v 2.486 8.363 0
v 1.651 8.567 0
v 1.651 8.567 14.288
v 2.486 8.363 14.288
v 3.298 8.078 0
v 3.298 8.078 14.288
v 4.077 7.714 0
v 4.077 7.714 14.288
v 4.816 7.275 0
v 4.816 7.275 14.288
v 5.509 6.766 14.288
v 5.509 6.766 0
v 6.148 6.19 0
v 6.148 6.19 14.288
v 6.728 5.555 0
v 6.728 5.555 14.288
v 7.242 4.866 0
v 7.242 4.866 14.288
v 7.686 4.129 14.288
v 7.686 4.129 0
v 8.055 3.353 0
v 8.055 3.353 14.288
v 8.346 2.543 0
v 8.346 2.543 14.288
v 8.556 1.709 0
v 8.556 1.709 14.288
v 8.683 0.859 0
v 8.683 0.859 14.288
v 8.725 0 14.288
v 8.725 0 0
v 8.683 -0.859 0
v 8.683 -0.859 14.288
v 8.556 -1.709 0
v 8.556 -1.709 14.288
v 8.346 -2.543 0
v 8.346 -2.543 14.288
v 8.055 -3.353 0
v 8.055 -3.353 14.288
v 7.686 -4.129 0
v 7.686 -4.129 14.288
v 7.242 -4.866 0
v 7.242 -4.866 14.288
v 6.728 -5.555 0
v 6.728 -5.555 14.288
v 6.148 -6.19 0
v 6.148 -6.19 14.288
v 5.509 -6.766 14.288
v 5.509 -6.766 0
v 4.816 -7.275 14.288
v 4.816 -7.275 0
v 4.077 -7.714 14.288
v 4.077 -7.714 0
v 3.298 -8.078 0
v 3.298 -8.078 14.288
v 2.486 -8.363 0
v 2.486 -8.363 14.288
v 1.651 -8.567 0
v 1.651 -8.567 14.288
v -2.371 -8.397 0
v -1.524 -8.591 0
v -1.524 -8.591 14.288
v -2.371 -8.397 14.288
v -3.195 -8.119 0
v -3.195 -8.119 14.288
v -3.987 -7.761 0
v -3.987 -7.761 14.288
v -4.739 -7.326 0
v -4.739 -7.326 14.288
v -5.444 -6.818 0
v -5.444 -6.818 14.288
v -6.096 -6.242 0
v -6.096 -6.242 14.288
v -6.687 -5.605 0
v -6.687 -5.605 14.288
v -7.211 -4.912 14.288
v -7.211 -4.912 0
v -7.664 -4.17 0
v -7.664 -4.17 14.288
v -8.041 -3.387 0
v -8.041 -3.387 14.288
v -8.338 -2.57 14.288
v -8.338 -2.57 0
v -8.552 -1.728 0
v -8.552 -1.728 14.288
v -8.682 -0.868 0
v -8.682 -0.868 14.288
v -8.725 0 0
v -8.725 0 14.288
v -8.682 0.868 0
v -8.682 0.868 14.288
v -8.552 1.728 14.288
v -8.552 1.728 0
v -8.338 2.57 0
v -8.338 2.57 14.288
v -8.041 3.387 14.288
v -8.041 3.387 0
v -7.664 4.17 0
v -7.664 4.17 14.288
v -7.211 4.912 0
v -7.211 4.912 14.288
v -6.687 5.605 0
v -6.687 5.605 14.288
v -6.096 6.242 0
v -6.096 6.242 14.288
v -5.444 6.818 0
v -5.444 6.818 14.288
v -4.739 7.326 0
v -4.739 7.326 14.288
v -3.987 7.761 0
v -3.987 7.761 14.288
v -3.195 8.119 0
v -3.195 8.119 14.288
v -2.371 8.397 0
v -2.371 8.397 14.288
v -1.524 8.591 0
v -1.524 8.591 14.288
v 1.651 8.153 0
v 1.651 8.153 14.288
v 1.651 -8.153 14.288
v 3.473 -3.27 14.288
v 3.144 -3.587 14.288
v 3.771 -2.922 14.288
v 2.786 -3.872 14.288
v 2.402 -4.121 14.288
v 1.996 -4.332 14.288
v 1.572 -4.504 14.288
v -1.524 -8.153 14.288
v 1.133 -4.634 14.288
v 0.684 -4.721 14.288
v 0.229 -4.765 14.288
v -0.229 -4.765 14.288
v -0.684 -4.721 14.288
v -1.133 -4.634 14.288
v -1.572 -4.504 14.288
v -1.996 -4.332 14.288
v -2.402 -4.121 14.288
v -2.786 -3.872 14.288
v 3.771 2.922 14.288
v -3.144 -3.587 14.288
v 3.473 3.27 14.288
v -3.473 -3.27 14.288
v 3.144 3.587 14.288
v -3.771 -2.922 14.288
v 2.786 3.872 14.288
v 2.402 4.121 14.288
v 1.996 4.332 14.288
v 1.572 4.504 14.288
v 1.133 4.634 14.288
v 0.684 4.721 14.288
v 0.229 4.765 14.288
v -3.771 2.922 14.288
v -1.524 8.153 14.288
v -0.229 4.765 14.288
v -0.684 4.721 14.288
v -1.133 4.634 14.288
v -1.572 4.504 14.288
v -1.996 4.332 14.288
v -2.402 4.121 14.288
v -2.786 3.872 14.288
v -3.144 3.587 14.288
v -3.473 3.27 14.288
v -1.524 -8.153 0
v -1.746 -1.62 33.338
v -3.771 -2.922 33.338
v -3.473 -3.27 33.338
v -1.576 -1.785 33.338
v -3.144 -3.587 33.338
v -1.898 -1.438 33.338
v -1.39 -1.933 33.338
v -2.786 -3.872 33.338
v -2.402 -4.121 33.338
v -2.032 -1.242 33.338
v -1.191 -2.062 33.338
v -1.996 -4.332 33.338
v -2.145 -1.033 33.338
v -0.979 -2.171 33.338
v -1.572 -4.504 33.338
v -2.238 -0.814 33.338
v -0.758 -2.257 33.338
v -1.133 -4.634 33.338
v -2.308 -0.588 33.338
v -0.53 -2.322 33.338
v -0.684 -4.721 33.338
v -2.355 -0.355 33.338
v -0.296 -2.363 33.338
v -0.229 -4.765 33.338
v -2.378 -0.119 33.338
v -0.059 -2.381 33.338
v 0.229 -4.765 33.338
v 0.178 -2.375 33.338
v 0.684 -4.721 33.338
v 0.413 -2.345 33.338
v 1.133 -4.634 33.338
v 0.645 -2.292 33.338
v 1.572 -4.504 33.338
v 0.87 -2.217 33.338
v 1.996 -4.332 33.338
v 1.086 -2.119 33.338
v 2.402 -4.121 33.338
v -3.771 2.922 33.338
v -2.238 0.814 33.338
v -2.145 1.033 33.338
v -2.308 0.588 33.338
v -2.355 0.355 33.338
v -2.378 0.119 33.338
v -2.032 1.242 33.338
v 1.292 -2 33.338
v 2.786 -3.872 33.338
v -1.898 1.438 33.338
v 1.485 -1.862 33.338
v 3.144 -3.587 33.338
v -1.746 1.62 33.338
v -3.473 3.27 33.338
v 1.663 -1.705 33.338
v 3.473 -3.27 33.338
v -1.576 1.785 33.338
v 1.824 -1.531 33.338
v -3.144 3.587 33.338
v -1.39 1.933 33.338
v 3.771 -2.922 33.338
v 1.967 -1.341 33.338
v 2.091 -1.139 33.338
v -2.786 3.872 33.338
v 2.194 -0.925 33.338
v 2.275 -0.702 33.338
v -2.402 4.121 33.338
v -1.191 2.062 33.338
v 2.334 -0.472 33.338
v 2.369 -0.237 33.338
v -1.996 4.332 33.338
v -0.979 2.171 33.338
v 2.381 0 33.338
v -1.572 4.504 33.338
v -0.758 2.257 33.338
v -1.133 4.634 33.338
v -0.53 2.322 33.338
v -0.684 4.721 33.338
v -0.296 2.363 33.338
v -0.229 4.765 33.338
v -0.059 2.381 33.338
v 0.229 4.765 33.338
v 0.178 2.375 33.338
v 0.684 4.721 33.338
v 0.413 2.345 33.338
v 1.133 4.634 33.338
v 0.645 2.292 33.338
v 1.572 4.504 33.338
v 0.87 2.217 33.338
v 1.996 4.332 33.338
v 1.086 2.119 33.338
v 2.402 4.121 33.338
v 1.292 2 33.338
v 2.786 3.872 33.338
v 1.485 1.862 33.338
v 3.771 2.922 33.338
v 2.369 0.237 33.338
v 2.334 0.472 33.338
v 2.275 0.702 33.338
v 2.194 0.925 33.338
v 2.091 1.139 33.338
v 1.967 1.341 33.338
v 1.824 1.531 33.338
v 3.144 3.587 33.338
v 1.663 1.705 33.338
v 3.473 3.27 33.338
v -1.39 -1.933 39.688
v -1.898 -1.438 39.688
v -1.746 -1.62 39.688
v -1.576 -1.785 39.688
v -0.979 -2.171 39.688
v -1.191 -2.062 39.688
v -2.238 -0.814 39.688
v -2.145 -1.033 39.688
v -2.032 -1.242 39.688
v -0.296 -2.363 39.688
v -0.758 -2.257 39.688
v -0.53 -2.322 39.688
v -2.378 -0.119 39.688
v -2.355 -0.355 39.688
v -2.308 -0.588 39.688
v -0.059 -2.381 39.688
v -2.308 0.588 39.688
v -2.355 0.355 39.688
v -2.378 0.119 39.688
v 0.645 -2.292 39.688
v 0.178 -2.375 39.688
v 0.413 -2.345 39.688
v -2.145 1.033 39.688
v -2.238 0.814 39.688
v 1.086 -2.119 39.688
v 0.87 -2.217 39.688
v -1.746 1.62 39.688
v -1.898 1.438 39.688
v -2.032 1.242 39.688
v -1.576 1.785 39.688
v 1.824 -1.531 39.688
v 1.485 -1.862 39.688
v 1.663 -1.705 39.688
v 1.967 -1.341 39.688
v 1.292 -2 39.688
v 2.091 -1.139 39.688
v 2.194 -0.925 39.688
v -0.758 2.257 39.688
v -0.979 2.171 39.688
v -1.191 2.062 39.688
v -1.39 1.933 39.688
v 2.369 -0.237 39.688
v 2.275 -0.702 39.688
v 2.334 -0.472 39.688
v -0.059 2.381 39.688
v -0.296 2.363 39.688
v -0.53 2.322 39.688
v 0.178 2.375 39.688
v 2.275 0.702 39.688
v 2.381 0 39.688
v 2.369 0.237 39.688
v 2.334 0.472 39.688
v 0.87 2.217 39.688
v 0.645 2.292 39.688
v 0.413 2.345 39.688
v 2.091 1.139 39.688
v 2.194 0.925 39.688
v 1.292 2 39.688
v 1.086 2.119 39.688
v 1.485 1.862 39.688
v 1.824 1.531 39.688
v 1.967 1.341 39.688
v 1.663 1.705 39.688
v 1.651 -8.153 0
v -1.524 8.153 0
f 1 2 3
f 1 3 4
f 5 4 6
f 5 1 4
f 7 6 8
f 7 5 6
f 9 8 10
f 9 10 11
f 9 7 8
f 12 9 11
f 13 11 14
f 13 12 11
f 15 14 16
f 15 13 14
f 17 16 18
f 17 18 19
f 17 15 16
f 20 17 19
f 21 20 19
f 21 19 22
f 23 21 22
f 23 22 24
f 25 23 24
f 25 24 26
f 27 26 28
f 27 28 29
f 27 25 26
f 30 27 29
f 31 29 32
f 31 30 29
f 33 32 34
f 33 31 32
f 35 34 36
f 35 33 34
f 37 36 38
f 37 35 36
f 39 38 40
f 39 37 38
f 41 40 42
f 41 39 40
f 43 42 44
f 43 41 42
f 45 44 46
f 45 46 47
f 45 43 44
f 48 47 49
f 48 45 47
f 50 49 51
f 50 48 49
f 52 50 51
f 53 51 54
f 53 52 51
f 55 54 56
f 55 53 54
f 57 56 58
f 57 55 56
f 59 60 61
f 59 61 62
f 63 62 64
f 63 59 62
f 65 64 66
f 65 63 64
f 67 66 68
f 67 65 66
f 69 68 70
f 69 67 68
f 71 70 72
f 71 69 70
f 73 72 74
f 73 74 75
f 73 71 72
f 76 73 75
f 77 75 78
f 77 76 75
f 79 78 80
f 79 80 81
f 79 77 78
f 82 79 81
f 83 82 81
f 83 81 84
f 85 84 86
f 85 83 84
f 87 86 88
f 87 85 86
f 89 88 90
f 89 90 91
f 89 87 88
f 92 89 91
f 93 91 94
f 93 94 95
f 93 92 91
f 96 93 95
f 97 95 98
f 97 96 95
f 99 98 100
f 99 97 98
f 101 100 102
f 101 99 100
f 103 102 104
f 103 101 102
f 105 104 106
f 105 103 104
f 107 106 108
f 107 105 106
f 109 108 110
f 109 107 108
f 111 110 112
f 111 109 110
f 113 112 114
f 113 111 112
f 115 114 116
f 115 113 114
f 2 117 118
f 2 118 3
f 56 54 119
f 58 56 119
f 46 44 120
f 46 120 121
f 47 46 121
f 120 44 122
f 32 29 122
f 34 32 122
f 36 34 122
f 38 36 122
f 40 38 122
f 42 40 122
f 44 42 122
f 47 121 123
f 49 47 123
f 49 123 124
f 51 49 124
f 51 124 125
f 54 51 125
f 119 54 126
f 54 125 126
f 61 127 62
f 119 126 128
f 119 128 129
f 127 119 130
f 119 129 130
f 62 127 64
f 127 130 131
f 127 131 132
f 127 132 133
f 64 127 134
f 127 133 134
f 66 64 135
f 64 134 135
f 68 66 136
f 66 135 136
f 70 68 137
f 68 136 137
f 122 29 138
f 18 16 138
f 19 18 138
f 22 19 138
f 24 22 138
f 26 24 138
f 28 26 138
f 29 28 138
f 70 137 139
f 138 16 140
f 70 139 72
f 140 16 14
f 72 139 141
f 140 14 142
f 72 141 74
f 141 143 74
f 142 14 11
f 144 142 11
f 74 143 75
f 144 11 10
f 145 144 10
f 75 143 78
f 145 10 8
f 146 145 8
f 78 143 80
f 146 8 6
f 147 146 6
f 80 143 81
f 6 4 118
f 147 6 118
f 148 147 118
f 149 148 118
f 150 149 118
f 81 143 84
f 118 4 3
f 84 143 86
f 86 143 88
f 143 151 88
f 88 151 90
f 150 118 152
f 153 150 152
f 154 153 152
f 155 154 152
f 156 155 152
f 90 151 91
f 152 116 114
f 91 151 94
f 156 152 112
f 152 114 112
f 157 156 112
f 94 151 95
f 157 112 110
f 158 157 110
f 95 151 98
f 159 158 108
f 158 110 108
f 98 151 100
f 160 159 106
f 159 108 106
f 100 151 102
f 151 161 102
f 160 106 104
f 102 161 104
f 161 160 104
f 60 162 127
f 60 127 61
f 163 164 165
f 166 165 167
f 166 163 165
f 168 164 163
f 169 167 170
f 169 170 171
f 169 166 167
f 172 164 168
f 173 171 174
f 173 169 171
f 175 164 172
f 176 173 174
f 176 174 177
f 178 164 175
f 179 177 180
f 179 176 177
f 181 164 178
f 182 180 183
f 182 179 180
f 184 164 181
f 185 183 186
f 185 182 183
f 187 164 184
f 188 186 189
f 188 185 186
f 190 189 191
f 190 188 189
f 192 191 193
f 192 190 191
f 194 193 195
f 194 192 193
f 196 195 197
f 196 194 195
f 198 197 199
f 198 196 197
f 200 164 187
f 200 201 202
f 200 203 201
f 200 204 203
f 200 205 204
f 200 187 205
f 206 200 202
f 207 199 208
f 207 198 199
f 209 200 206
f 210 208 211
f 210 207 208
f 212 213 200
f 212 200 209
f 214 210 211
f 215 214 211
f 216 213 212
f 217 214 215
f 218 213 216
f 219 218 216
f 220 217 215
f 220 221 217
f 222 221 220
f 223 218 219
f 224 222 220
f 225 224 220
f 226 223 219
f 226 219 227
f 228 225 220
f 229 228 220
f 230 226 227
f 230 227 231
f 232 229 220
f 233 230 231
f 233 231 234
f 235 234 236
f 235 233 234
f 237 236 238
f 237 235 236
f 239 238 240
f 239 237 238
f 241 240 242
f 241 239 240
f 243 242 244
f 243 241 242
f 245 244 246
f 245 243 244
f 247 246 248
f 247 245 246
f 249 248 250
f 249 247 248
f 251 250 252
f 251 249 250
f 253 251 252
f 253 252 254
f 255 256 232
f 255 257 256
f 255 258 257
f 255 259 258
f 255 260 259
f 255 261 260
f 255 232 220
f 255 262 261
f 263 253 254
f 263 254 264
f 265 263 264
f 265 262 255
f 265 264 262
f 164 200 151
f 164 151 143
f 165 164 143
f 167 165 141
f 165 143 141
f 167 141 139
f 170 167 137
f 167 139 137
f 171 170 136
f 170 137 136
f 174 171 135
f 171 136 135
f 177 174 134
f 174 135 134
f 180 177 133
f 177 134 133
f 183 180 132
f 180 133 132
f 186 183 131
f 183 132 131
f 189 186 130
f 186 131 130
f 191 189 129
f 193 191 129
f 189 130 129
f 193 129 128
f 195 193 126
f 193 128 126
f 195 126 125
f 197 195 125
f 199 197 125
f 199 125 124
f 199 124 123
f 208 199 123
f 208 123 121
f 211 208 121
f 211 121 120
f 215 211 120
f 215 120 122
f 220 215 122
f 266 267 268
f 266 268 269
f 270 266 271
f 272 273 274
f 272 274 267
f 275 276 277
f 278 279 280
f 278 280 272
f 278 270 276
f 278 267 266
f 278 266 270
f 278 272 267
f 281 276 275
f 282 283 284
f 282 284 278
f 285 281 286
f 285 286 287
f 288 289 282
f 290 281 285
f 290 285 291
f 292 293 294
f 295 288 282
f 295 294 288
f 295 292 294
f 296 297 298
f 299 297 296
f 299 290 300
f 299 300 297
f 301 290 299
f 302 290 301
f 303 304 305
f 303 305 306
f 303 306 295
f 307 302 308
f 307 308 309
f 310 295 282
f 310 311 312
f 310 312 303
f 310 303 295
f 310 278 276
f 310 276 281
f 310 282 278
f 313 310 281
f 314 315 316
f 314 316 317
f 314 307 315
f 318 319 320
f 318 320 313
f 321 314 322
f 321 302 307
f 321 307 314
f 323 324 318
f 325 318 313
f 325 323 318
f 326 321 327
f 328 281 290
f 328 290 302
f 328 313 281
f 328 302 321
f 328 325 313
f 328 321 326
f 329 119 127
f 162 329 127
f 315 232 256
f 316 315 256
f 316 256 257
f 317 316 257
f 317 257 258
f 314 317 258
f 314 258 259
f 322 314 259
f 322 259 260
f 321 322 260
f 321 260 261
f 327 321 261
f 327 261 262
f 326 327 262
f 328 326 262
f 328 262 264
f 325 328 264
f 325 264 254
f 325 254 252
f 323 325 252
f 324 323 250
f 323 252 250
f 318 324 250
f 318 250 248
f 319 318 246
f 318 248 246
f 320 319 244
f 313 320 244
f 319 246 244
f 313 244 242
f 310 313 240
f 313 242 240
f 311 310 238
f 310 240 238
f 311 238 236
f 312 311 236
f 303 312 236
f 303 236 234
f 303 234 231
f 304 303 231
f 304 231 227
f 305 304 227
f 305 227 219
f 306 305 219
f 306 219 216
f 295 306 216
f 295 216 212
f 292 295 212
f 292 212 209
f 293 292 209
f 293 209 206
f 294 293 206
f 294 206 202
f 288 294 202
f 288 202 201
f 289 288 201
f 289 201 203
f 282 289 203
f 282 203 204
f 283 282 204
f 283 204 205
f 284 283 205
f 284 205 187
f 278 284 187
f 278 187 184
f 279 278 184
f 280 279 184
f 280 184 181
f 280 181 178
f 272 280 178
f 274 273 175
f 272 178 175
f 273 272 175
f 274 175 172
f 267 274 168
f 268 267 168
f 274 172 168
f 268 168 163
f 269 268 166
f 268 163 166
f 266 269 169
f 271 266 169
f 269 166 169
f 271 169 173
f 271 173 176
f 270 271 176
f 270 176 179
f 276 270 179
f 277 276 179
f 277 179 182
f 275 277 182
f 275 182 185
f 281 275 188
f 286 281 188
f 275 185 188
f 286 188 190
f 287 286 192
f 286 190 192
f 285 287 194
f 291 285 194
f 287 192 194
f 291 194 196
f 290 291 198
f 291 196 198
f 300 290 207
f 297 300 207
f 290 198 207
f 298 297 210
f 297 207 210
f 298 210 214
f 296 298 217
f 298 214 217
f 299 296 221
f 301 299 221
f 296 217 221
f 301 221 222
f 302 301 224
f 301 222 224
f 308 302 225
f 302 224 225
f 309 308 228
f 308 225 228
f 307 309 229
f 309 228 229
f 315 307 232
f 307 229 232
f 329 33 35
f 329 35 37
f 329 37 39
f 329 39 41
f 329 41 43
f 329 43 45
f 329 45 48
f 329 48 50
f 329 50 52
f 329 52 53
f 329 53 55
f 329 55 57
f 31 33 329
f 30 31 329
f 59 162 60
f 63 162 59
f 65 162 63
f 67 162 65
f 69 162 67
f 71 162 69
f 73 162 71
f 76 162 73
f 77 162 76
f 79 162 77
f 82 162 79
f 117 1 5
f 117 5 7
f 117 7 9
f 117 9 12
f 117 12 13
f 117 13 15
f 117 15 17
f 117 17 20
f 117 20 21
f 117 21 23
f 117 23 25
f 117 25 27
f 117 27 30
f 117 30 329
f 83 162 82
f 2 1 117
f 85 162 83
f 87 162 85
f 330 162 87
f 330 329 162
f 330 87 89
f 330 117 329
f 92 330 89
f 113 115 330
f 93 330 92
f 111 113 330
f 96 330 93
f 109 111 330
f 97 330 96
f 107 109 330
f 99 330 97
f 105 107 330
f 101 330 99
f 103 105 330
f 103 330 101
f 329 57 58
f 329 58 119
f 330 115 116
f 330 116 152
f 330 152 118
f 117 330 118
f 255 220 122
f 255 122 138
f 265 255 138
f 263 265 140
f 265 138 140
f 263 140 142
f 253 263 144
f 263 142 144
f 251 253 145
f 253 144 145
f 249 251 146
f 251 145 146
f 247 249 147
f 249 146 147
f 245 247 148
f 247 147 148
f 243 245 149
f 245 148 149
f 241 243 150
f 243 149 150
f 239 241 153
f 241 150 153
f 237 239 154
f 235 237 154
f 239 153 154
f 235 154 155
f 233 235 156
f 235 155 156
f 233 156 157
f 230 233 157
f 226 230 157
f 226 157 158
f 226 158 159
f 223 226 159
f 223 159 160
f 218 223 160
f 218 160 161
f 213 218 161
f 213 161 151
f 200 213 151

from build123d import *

# Parameters (mm, degrees)
SALIENTE_EXTRUIR4_DEPTH = 14.2875
CROQUIS1_6_R            = 2.38125
SALIENTE_EXTRUIR5_DEPTH = 33.3375
CROQUIS1_7_R            = 2.38125
SALIENTE_EXTRUIR6_DEPTH = 39.6875


with BuildPart() as part:
    # Croquis1 → Saliente-Extruir4 (new body)
    with BuildSketch(Plane.XY):
        with BuildLine():
            Line((-1.524, 8.152705854), (-1.524, 8.590768534))
            ThreePointArc((-1.524, 8.590768534), (-8.7249, 0), (-1.524, -8.590768534))
            Line((-1.524, -8.590768534), (-1.524, -8.152705854))
            Line((-1.524, -8.152705854), (1.651, -8.152705854))
            Line((1.651, -8.152705854), (1.651, -8.567267885))
            ThreePointArc((1.651, -8.567267885), (8.7249, 0), (1.651, 8.567267885))
            Line((1.651, 8.567267885), (1.651, 8.152705854))
            Line((1.651, 8.152705854), (-1.524, 8.152705854))
        make_face()
        with BuildLine():
            ThreePointArc((3.77063, -2.921710837), (0, -4.77012), (-3.77063, -2.921710837))
            Line((-3.77063, -2.921710837), (-3.77063, 2.921710837))
            ThreePointArc((-3.77063, 2.921710837), (0, 4.77012), (3.77063, 2.921710837))
            Line((3.77063, 2.921710837), (3.77063, -2.921710837))
        make_face(mode=Mode.SUBTRACT)
    extrude(amount=SALIENTE_EXTRUIR4_DEPTH)

    # Croquis1<6> → Saliente-Extruir5 (add)
    with BuildSketch(Plane.XY):
        with BuildLine():
            Line((-3.77063, 2.921710837), (-3.77063, -2.921710837))
            ThreePointArc((-3.77063, -2.921710837), (0, -4.77012), (3.77063, -2.921710837))
            Line((3.77063, -2.921710837), (3.77063, 2.921710837))
            ThreePointArc((3.77063, 2.921710837), (0, 4.77012), (-3.77063, 2.921710837))
        make_face()
        Circle(CROQUIS1_6_R, mode=Mode.SUBTRACT)
    extrude(amount=SALIENTE_EXTRUIR5_DEPTH)

    # Croquis1<7> → Saliente-Extruir6 (add)
    with BuildSketch(Plane.XY):
        Circle(CROQUIS1_7_R)
    extrude(amount=SALIENTE_EXTRUIR6_DEPTH)


solid = part.part
